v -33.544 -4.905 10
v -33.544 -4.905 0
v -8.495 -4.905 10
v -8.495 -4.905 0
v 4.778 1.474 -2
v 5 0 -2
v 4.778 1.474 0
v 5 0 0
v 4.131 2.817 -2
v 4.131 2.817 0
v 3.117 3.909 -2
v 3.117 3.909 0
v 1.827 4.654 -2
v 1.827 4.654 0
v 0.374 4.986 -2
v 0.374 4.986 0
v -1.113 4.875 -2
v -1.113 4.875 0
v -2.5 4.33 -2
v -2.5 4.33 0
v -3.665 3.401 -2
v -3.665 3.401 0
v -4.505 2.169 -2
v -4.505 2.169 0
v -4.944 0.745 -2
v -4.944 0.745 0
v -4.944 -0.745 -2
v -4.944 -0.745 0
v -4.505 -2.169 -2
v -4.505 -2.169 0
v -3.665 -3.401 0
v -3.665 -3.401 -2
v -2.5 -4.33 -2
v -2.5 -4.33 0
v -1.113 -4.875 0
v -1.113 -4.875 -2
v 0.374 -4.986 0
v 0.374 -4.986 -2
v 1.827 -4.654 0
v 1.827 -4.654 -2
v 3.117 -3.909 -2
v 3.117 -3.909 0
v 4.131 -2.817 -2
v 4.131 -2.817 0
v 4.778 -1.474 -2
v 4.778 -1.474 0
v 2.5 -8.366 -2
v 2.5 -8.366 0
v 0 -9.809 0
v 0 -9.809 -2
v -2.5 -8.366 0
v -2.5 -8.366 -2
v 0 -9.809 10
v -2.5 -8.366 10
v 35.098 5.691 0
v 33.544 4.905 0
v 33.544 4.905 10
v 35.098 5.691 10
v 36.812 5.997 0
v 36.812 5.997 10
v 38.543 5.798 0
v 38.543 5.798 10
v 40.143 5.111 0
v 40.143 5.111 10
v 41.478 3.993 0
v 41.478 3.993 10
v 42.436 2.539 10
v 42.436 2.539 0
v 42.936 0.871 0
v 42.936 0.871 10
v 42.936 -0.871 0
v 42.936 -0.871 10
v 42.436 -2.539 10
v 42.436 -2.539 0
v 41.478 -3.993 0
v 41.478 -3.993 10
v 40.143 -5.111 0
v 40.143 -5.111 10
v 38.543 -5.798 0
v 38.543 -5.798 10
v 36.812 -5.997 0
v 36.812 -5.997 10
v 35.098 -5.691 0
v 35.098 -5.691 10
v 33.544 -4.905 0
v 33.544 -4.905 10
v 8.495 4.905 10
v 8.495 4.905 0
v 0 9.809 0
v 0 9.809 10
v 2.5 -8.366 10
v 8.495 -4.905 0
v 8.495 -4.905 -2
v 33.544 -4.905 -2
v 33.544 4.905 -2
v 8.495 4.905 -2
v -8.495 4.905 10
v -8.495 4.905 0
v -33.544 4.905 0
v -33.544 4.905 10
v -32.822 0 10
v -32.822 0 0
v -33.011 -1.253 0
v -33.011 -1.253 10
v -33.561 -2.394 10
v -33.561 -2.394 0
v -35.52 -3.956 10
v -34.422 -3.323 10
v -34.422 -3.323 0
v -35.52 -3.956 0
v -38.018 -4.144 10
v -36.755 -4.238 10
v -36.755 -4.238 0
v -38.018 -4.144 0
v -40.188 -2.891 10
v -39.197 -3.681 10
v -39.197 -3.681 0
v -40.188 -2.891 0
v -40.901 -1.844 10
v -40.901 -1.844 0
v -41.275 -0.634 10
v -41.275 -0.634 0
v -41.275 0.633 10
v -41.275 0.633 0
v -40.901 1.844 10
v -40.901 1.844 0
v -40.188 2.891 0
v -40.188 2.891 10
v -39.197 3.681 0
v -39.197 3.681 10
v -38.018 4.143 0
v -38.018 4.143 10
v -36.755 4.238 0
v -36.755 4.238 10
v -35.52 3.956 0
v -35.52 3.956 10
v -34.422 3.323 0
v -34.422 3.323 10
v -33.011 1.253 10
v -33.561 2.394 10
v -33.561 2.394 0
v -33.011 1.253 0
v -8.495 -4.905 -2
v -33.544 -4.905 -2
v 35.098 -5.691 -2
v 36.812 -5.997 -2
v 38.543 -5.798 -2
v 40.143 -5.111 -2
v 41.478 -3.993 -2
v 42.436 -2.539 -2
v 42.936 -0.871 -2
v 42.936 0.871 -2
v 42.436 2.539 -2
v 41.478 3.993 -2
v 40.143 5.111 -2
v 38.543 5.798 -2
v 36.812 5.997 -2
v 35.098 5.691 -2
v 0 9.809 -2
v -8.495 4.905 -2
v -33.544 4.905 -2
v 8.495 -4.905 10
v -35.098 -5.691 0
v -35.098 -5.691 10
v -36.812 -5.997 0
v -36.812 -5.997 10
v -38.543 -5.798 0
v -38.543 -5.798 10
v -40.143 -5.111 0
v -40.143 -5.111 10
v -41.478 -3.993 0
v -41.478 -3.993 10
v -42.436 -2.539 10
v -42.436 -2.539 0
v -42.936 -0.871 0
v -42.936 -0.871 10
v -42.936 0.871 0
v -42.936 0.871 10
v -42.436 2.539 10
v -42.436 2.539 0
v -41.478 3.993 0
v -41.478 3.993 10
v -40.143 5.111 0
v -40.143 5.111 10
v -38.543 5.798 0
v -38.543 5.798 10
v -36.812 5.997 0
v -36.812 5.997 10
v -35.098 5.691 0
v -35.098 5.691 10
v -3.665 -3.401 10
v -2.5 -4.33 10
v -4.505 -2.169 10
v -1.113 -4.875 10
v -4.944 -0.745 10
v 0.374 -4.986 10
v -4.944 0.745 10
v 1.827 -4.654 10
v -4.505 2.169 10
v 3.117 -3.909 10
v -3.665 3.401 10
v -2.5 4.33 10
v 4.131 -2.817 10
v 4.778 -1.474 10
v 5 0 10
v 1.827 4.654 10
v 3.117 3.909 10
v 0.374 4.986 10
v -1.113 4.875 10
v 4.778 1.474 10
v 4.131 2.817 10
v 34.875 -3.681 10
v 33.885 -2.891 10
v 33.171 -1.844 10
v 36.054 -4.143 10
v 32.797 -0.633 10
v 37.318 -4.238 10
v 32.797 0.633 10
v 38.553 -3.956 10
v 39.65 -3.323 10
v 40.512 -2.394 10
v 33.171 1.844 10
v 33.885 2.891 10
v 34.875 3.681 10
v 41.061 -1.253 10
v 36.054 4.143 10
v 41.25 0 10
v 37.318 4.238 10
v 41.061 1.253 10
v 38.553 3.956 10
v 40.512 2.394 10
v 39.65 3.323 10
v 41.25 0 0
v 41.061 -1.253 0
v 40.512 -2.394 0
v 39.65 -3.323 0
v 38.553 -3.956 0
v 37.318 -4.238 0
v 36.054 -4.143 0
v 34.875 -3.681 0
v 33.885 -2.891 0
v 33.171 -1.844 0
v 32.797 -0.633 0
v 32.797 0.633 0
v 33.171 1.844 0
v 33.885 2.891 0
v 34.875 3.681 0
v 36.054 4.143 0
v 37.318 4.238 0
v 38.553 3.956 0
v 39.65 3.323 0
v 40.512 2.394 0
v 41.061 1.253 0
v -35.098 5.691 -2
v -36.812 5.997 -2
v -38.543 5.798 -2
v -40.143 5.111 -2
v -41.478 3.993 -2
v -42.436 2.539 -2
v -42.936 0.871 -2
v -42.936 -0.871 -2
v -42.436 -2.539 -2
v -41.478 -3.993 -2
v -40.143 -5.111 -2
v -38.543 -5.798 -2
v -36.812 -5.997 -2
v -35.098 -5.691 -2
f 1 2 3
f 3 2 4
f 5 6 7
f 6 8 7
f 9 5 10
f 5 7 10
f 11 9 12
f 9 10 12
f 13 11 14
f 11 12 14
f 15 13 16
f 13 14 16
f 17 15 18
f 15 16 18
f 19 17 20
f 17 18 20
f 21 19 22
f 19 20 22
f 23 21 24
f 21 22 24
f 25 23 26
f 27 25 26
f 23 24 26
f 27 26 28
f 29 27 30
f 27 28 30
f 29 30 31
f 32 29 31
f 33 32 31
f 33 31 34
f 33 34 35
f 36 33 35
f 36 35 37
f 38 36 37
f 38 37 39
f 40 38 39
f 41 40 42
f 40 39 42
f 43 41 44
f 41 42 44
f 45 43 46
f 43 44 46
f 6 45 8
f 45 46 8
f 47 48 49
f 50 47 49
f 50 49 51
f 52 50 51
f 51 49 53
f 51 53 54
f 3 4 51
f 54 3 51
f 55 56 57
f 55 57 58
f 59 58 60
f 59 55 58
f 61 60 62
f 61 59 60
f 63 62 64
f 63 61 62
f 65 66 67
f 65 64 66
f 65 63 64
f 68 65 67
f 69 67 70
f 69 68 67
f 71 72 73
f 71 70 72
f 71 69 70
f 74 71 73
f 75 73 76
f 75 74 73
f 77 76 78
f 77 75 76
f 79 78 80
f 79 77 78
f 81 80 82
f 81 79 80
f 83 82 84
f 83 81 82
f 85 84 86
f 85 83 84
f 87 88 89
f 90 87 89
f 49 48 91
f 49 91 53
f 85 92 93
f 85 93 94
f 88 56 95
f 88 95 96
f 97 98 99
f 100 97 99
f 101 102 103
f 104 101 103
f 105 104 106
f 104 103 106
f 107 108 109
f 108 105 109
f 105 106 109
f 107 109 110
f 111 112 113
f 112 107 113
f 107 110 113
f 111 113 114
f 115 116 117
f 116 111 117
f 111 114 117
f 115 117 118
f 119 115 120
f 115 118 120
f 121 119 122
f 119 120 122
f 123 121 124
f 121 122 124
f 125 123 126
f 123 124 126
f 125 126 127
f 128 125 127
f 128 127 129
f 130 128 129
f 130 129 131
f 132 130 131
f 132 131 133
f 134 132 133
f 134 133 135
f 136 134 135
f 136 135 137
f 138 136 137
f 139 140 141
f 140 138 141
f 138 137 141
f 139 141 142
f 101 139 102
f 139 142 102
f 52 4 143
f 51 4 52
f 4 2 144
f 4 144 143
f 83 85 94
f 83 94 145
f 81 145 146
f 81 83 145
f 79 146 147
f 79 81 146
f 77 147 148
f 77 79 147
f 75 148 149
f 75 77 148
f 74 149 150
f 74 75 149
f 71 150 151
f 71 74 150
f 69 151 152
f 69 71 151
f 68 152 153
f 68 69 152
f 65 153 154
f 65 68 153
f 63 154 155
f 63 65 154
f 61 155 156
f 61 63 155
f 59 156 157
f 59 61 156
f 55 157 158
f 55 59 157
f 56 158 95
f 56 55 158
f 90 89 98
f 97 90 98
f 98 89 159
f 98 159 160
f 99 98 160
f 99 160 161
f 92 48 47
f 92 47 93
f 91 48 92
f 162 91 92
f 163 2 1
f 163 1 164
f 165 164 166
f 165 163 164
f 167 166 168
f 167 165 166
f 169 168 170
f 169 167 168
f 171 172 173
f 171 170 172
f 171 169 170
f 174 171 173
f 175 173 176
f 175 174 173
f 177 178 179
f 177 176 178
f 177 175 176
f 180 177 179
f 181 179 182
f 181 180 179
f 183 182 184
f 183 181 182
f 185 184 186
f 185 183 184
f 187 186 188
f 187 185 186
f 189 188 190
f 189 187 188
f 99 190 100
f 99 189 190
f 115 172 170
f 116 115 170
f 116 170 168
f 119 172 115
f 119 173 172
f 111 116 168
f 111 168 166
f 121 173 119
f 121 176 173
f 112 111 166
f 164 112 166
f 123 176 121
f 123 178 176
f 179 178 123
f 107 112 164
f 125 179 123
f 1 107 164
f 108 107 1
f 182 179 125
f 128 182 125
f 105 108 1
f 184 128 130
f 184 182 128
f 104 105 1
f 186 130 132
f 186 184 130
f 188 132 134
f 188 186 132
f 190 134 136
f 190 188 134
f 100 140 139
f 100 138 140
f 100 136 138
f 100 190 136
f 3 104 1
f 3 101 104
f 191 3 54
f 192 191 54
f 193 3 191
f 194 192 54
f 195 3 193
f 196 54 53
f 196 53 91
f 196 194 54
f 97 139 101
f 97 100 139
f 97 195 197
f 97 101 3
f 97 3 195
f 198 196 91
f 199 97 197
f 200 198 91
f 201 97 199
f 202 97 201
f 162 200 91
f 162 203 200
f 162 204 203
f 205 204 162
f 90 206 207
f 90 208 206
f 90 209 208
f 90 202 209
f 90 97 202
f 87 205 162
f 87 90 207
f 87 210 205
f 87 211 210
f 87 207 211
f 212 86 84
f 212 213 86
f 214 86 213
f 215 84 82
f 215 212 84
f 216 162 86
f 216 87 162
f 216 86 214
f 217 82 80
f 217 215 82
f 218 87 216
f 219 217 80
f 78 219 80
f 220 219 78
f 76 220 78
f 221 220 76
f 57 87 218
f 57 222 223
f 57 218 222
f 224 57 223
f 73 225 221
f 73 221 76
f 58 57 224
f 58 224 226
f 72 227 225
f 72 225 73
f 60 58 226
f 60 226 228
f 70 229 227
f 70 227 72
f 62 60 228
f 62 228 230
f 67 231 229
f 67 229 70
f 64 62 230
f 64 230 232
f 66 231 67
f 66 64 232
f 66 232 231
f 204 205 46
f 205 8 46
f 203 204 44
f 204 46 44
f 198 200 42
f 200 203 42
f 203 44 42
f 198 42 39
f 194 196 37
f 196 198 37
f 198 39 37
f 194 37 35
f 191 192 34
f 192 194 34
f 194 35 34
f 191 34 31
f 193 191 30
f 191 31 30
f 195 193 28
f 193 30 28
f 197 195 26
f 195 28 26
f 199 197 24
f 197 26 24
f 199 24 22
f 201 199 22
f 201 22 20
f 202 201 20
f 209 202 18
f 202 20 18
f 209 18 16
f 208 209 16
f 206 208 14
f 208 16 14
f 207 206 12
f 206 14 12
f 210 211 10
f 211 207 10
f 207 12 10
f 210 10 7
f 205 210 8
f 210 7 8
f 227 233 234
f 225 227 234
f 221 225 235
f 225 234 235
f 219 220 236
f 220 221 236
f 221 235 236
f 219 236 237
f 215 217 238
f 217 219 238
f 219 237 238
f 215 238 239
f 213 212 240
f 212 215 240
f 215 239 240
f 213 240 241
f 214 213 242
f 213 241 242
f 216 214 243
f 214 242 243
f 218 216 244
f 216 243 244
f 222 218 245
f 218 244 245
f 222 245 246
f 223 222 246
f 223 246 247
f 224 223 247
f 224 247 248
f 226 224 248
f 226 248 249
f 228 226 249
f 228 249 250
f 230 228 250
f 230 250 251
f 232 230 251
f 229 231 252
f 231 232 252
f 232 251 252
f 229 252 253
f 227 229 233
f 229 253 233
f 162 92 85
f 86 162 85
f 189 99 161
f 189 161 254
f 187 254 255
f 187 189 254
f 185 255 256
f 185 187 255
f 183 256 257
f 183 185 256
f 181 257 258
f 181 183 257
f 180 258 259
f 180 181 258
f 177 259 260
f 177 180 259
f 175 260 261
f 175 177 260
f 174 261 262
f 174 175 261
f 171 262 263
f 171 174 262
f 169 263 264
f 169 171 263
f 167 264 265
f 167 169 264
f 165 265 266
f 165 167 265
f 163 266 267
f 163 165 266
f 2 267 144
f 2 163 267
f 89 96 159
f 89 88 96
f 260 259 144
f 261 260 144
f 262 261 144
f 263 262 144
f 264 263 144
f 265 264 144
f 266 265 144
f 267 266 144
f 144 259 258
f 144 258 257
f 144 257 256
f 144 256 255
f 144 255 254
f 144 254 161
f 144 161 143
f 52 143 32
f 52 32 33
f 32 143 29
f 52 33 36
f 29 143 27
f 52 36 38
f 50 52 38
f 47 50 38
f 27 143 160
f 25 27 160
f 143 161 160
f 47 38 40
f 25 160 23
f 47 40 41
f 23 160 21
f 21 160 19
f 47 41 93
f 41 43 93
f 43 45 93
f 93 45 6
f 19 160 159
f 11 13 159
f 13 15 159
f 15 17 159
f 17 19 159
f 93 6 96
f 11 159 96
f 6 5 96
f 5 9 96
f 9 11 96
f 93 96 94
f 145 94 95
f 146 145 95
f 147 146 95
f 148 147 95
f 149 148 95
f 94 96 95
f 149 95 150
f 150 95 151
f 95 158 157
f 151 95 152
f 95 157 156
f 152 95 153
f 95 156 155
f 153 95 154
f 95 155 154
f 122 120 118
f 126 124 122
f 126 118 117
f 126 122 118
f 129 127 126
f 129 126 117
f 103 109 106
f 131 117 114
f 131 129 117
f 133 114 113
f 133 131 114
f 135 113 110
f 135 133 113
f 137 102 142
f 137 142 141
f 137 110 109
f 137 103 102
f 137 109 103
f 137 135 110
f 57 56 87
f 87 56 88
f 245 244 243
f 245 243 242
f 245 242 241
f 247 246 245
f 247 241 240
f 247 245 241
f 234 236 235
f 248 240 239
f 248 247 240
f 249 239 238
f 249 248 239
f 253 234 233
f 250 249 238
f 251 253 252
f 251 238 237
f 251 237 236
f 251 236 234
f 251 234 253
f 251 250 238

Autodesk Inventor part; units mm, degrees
ref_plane "YZ Plane" through (0, 0, 0) normal (1, 0, 0) x (0, 1, 0)
ref_plane "XZ Plane" through (0, 0, 0) normal (0, 1, 0) x (-1, 0, 0)
ref_plane "XY Plane" through (0, 0, 0) normal (0, 0, 1) x (1, 0, 0)
sketch "Sketch1" plane through (0, 0, 0) normal (0, 0, 1) x (1, 0, 0)
  line L0 (0, -7.5) -> (-6.4952, -3.75) projected
  line L1 (-6.4952, -3.75) -> (-6.4952, 3.75) projected
  line L2 (-6.4952, 3.75) -> (0, 7.5) projected
  line L3 (0, 7.5) -> (6.4952, 3.75) projected
  line L4 (6.4952, 3.75) -> (6.4952, -3.75) projected
  line L5 (6.4952, -3.75) -> (0, -7.5) projected
  line L6 (-2.5, -8.366) -> (-2.5, -24.8094) projected
  line L7 (-2.5, -24.8094) -> (-10, -24.8094) projected
  line L8 (-10, -24.8094) -> (-10, -27.8094) projected
  line L9 (10, -27.8094) -> (-10, -27.8094) projected
  line L10 (10, -24.8094) -> (10, -27.8094) projected
  line L11 (10, -24.8094) -> (2.5, -24.8094) projected
  line L12 (2.5, -24.8094) -> (2.5, -8.366) projected
  line L13 (2.5, -8.366) -> (8.4952, -4.9047) projected
  line L14 (8.4952, -4.9047) -> (33.544, -4.9047) projected
  arc A0 (33.544, -4.9047) -> (33.544, 4.9047) centre (37, 0) ccw projected
  line L15 (33.544, 4.9047) -> (8.4952, 4.9047) projected
  line L16 (8.4952, 4.9047) -> (0, 9.8094) projected
  line L17 (0, 9.8094) -> (-8.4952, 4.9047) projected
  line L18 (-8.4952, 4.9047) -> (-33.544, 4.9047) projected
  arc A1 (-33.544, 4.9047) -> (-33.544, -4.9047) centre (-37, 0) ccw projected
  line L19 (-33.544, -4.9047) -> (-8.4952, -4.9047) projected
  line L20 (-8.4952, -4.9047) -> (-2.5, -8.366) projected
  circle A2 centre (37, 0) radius 4.25 projected
  circle A3 centre (-19.7476, 0) radius 2.5 projected
  circle A4 centre (19.7476, 0) radius 2.5 projected
  circle A5 centre (-37.0722, -0.0001) radius 4.25 projected
  line L21 (6.4952, 3.75) -> (6.4952, -3.75) projected
  line L22 (0, 7.5) -> (6.4952, 3.75) projected
  line L23 (-6.4952, 3.75) -> (0, 7.5) projected
  line L24 (-6.4952, -3.75) -> (-6.4952, 3.75) projected
  line L25 (0, -7.5) -> (-6.4952, -3.75) projected
  line L26 (6.4952, -3.75) -> (0, -7.5) projected
  circle A6 centre (0, 0) radius 5 projected
  line L27 (0, 9.8094) -> (8.4952, 4.9047)
  line L28 (8.4952, 4.9047) -> (8.4952, -4.9047)
  line L29 (8.4952, -4.9047) -> (0, -9.8094)
  line L30 (0, -9.8094) -> (-8.4952, -4.9047)
  line L31 (-8.4952, -4.9047) -> (-8.4952, 4.9047)
  line L32 (-8.4952, 4.9047) -> (0, 9.8094)
extrude "Extrusion1" add sketch "Sketch1" against normal blind 2 contours L0 L1 L2 L3 L4 L5 | L20 L31 L17 L16 L28 L13 L29 L30 | L19 A1 L18 L31 | L28 L15 A0 L14 | A2 | A3 | A4 | A5
extrude "Extrusion2" add sketch "Sketch1" along normal blind 10 contours L0 L1 L2 L3 L4 L5 | L20 L31 L17 L16 L28 L13 L29 L30 | L19 A1 L18 L31 | L28 L15 A0 L14 | A3 | A4
properties part number "chep_za_os"
